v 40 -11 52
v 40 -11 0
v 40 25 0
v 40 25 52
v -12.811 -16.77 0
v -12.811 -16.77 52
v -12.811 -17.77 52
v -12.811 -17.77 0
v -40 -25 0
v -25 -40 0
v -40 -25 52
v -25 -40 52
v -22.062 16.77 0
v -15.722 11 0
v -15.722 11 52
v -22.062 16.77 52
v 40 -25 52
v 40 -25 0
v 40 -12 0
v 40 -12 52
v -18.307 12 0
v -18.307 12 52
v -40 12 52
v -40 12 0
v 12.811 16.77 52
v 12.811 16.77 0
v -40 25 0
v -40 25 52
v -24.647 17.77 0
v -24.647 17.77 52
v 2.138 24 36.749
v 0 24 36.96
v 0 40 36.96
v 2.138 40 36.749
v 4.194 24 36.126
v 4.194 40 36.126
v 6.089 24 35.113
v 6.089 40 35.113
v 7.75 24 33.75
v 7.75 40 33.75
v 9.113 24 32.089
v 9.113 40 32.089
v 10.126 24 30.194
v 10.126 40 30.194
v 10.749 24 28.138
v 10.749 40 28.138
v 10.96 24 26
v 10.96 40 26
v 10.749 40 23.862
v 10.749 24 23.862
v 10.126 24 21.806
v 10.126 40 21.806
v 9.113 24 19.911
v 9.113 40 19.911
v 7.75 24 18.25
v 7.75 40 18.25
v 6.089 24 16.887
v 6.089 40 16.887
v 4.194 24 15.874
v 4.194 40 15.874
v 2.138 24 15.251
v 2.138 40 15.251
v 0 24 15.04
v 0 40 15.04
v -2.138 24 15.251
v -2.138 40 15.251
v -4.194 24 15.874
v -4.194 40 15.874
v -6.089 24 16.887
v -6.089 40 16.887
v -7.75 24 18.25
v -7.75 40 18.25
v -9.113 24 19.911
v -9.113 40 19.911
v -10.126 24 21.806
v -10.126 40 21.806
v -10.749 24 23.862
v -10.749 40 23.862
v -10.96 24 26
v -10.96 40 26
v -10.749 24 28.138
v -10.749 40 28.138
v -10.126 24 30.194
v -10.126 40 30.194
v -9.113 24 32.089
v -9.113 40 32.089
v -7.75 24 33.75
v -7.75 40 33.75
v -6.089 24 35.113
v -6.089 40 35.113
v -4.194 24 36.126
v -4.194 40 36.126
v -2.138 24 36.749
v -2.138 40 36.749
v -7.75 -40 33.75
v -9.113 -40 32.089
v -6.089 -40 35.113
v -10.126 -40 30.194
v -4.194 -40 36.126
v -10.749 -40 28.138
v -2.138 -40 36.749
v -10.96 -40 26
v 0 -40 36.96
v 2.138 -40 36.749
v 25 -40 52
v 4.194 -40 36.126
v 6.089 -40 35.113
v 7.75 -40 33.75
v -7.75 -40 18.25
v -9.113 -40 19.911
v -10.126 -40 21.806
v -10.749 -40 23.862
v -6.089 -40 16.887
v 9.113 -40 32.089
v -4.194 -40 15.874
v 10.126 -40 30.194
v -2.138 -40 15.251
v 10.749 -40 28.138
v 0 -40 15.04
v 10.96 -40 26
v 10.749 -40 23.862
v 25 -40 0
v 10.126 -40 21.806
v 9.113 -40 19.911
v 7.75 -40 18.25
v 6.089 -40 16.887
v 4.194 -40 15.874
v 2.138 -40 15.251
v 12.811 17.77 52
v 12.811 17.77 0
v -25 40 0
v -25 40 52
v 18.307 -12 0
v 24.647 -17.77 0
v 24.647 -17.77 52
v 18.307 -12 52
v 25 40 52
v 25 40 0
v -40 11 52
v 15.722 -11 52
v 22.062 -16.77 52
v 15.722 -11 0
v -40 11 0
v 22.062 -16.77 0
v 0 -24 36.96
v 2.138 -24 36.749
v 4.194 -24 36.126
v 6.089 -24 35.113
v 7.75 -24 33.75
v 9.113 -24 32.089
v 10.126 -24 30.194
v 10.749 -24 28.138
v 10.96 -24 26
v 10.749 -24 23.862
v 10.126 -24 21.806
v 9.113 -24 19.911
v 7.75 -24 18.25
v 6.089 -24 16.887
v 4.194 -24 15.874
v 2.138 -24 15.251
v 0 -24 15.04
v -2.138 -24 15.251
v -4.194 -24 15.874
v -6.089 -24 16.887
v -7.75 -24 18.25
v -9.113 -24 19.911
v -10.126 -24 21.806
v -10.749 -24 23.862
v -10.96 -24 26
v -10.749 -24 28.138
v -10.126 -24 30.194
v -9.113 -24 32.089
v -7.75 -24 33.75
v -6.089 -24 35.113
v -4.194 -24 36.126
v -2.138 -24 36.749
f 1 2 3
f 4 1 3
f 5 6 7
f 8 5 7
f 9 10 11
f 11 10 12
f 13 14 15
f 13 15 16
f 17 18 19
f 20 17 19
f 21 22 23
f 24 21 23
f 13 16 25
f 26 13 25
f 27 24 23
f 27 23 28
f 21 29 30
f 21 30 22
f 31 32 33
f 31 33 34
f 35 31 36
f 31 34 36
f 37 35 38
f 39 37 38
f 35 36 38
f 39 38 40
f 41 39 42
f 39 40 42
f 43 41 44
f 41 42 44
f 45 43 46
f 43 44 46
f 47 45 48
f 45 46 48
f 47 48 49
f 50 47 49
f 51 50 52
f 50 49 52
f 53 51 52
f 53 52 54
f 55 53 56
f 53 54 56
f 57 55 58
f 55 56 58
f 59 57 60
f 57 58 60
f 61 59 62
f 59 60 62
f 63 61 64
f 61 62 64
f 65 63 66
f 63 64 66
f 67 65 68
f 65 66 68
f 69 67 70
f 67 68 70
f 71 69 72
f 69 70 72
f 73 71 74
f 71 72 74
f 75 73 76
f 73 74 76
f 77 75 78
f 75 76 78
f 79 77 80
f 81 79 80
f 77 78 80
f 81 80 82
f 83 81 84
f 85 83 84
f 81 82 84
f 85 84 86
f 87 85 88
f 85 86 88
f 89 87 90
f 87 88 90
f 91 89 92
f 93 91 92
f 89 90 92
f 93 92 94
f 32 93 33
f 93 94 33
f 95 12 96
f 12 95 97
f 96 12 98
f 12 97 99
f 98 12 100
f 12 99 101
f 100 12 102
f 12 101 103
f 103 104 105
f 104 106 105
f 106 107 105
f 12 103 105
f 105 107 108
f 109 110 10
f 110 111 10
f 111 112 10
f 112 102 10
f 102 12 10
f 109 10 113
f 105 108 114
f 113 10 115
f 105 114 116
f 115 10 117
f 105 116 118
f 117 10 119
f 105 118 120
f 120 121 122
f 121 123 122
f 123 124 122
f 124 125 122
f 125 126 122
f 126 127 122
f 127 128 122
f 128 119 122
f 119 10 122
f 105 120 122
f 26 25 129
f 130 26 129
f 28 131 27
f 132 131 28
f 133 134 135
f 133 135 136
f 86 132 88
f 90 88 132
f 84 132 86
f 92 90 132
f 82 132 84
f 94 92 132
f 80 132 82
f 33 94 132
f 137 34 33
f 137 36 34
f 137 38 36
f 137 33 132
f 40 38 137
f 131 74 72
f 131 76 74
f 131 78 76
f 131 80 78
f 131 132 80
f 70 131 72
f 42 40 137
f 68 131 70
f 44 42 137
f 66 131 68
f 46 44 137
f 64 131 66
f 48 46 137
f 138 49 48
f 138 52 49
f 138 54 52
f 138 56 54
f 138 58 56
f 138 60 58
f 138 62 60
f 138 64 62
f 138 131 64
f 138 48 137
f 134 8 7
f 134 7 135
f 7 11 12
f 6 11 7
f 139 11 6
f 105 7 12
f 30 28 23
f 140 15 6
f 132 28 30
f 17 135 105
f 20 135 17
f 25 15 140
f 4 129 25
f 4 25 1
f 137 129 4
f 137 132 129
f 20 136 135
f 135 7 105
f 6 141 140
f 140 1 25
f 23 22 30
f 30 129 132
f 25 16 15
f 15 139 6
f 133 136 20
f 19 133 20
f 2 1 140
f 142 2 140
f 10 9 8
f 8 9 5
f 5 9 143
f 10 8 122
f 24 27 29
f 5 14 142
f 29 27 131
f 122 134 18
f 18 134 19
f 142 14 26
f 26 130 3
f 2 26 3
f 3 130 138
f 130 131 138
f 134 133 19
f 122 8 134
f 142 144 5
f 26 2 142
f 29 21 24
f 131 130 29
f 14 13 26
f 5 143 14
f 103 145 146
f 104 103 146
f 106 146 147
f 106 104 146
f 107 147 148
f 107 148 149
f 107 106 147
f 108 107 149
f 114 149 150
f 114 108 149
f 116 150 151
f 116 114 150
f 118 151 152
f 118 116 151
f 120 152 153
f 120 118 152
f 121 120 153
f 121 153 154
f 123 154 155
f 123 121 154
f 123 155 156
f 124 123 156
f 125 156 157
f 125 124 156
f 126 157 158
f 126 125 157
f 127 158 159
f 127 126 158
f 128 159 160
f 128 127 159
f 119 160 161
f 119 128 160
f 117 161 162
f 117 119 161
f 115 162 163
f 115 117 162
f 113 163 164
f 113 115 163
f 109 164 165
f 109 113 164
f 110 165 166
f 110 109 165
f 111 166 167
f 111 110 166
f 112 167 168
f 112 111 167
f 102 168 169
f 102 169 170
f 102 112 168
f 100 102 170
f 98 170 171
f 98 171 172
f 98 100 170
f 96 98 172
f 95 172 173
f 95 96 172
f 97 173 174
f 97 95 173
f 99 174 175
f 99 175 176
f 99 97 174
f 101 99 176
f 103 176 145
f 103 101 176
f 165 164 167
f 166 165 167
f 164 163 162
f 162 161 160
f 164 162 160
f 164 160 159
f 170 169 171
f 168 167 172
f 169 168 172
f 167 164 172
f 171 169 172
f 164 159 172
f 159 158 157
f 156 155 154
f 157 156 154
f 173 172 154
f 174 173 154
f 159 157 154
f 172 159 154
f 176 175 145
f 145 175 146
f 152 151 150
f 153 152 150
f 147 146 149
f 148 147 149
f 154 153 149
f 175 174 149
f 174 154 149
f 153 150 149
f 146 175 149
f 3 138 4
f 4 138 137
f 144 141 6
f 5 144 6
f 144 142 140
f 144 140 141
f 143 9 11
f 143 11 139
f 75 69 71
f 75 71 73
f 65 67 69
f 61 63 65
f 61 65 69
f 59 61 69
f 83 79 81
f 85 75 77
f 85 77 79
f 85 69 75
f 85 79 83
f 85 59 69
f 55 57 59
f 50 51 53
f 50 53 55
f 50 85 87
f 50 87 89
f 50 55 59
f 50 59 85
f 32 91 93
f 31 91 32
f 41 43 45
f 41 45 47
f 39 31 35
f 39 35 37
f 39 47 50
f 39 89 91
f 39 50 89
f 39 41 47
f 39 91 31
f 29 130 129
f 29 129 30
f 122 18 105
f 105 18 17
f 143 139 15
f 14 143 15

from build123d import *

# Parameters (mm, degrees)
SKETCH1_W                    = 80
SKETCH1_H                    = 80
BOSS_EXTRUDE1_DEPTH          = 52
CHAMFER1_SIZE                = 15
CUT_EXTRUDE_THIN2_DEPTH      = 77.837490849
CUT_EXTRUDE_THIN2_DEPTH_BACK = 77.837490849
SKETCH3_R                    = 10.96
CUT_EXTRUDE2_DEPTH           = 16


with BuildPart() as part:
    # Sketch1 → Boss-Extrude1 (new body)
    with BuildSketch(Plane.XY):
        Rectangle(SKETCH1_W, SKETCH1_H)
    extrude(amount=BOSS_EXTRUDE1_DEPTH)

    # Chamfer1
    chamfer1_edges = [part.edges().sort_by_distance(p)[0] for p in [
        (40, -40, 26),
        (-40, -40, 26),
        (-40, 40, 26),
        (40, 40, 26),
    ]]
    chamfer(chamfer1_edges, length=CHAMFER1_SIZE)

    # Sketch2 → Cut-Extrude-Thin2 (cut, two sides: drawn at the far end of the back side and taken through both)
    with BuildSketch(Plane(origin=(0, 0, 0), x_dir=(-1, 0, 0), z_dir=(0, 0, -1)).offset(-CUT_EXTRUDE_THIN2_DEPTH_BACK)):
        Polygon((44.0879895, 11), (15.722057871, 11), (22.061953445, 16.76959481), (-12.810565673, 16.76959481), (-12.810565673, 17.76959481), (24.646552449, 17.76959481), (18.306656875, 12), (44.0879895, 12), align=None)
        Polygon((-43.151938768, -11), (-15.722057871, -11), (-22.061953445, -16.76959481), (12.810565673, -16.76959481), (12.810565673, -17.76959481), (-24.646552449, -17.76959481), (-18.306656875, -12), (-43.151938768, -12), align=None)
    extrude(amount=CUT_EXTRUDE_THIN2_DEPTH + CUT_EXTRUDE_THIN2_DEPTH_BACK, mode=Mode.SUBTRACT)

    # Sketch3 → Cut-Extrude2 (cut)
    with BuildSketch(Plane(origin=(0, 40, 0), x_dir=(1, 0, 0), z_dir=(0, 1, 0))):
        with Locations(Location((0, -26, 0), (0, 0, 270))):
            Circle(SKETCH3_R)
    cut_extrude2 = extrude(amount=-CUT_EXTRUDE2_DEPTH, mode=Mode.SUBTRACT)

    # Mirror1: Cut-Extrude2 across plane
    add(cut_extrude2.mirror(Plane.ZX), mode=Mode.SUBTRACT)


solid = part.part
